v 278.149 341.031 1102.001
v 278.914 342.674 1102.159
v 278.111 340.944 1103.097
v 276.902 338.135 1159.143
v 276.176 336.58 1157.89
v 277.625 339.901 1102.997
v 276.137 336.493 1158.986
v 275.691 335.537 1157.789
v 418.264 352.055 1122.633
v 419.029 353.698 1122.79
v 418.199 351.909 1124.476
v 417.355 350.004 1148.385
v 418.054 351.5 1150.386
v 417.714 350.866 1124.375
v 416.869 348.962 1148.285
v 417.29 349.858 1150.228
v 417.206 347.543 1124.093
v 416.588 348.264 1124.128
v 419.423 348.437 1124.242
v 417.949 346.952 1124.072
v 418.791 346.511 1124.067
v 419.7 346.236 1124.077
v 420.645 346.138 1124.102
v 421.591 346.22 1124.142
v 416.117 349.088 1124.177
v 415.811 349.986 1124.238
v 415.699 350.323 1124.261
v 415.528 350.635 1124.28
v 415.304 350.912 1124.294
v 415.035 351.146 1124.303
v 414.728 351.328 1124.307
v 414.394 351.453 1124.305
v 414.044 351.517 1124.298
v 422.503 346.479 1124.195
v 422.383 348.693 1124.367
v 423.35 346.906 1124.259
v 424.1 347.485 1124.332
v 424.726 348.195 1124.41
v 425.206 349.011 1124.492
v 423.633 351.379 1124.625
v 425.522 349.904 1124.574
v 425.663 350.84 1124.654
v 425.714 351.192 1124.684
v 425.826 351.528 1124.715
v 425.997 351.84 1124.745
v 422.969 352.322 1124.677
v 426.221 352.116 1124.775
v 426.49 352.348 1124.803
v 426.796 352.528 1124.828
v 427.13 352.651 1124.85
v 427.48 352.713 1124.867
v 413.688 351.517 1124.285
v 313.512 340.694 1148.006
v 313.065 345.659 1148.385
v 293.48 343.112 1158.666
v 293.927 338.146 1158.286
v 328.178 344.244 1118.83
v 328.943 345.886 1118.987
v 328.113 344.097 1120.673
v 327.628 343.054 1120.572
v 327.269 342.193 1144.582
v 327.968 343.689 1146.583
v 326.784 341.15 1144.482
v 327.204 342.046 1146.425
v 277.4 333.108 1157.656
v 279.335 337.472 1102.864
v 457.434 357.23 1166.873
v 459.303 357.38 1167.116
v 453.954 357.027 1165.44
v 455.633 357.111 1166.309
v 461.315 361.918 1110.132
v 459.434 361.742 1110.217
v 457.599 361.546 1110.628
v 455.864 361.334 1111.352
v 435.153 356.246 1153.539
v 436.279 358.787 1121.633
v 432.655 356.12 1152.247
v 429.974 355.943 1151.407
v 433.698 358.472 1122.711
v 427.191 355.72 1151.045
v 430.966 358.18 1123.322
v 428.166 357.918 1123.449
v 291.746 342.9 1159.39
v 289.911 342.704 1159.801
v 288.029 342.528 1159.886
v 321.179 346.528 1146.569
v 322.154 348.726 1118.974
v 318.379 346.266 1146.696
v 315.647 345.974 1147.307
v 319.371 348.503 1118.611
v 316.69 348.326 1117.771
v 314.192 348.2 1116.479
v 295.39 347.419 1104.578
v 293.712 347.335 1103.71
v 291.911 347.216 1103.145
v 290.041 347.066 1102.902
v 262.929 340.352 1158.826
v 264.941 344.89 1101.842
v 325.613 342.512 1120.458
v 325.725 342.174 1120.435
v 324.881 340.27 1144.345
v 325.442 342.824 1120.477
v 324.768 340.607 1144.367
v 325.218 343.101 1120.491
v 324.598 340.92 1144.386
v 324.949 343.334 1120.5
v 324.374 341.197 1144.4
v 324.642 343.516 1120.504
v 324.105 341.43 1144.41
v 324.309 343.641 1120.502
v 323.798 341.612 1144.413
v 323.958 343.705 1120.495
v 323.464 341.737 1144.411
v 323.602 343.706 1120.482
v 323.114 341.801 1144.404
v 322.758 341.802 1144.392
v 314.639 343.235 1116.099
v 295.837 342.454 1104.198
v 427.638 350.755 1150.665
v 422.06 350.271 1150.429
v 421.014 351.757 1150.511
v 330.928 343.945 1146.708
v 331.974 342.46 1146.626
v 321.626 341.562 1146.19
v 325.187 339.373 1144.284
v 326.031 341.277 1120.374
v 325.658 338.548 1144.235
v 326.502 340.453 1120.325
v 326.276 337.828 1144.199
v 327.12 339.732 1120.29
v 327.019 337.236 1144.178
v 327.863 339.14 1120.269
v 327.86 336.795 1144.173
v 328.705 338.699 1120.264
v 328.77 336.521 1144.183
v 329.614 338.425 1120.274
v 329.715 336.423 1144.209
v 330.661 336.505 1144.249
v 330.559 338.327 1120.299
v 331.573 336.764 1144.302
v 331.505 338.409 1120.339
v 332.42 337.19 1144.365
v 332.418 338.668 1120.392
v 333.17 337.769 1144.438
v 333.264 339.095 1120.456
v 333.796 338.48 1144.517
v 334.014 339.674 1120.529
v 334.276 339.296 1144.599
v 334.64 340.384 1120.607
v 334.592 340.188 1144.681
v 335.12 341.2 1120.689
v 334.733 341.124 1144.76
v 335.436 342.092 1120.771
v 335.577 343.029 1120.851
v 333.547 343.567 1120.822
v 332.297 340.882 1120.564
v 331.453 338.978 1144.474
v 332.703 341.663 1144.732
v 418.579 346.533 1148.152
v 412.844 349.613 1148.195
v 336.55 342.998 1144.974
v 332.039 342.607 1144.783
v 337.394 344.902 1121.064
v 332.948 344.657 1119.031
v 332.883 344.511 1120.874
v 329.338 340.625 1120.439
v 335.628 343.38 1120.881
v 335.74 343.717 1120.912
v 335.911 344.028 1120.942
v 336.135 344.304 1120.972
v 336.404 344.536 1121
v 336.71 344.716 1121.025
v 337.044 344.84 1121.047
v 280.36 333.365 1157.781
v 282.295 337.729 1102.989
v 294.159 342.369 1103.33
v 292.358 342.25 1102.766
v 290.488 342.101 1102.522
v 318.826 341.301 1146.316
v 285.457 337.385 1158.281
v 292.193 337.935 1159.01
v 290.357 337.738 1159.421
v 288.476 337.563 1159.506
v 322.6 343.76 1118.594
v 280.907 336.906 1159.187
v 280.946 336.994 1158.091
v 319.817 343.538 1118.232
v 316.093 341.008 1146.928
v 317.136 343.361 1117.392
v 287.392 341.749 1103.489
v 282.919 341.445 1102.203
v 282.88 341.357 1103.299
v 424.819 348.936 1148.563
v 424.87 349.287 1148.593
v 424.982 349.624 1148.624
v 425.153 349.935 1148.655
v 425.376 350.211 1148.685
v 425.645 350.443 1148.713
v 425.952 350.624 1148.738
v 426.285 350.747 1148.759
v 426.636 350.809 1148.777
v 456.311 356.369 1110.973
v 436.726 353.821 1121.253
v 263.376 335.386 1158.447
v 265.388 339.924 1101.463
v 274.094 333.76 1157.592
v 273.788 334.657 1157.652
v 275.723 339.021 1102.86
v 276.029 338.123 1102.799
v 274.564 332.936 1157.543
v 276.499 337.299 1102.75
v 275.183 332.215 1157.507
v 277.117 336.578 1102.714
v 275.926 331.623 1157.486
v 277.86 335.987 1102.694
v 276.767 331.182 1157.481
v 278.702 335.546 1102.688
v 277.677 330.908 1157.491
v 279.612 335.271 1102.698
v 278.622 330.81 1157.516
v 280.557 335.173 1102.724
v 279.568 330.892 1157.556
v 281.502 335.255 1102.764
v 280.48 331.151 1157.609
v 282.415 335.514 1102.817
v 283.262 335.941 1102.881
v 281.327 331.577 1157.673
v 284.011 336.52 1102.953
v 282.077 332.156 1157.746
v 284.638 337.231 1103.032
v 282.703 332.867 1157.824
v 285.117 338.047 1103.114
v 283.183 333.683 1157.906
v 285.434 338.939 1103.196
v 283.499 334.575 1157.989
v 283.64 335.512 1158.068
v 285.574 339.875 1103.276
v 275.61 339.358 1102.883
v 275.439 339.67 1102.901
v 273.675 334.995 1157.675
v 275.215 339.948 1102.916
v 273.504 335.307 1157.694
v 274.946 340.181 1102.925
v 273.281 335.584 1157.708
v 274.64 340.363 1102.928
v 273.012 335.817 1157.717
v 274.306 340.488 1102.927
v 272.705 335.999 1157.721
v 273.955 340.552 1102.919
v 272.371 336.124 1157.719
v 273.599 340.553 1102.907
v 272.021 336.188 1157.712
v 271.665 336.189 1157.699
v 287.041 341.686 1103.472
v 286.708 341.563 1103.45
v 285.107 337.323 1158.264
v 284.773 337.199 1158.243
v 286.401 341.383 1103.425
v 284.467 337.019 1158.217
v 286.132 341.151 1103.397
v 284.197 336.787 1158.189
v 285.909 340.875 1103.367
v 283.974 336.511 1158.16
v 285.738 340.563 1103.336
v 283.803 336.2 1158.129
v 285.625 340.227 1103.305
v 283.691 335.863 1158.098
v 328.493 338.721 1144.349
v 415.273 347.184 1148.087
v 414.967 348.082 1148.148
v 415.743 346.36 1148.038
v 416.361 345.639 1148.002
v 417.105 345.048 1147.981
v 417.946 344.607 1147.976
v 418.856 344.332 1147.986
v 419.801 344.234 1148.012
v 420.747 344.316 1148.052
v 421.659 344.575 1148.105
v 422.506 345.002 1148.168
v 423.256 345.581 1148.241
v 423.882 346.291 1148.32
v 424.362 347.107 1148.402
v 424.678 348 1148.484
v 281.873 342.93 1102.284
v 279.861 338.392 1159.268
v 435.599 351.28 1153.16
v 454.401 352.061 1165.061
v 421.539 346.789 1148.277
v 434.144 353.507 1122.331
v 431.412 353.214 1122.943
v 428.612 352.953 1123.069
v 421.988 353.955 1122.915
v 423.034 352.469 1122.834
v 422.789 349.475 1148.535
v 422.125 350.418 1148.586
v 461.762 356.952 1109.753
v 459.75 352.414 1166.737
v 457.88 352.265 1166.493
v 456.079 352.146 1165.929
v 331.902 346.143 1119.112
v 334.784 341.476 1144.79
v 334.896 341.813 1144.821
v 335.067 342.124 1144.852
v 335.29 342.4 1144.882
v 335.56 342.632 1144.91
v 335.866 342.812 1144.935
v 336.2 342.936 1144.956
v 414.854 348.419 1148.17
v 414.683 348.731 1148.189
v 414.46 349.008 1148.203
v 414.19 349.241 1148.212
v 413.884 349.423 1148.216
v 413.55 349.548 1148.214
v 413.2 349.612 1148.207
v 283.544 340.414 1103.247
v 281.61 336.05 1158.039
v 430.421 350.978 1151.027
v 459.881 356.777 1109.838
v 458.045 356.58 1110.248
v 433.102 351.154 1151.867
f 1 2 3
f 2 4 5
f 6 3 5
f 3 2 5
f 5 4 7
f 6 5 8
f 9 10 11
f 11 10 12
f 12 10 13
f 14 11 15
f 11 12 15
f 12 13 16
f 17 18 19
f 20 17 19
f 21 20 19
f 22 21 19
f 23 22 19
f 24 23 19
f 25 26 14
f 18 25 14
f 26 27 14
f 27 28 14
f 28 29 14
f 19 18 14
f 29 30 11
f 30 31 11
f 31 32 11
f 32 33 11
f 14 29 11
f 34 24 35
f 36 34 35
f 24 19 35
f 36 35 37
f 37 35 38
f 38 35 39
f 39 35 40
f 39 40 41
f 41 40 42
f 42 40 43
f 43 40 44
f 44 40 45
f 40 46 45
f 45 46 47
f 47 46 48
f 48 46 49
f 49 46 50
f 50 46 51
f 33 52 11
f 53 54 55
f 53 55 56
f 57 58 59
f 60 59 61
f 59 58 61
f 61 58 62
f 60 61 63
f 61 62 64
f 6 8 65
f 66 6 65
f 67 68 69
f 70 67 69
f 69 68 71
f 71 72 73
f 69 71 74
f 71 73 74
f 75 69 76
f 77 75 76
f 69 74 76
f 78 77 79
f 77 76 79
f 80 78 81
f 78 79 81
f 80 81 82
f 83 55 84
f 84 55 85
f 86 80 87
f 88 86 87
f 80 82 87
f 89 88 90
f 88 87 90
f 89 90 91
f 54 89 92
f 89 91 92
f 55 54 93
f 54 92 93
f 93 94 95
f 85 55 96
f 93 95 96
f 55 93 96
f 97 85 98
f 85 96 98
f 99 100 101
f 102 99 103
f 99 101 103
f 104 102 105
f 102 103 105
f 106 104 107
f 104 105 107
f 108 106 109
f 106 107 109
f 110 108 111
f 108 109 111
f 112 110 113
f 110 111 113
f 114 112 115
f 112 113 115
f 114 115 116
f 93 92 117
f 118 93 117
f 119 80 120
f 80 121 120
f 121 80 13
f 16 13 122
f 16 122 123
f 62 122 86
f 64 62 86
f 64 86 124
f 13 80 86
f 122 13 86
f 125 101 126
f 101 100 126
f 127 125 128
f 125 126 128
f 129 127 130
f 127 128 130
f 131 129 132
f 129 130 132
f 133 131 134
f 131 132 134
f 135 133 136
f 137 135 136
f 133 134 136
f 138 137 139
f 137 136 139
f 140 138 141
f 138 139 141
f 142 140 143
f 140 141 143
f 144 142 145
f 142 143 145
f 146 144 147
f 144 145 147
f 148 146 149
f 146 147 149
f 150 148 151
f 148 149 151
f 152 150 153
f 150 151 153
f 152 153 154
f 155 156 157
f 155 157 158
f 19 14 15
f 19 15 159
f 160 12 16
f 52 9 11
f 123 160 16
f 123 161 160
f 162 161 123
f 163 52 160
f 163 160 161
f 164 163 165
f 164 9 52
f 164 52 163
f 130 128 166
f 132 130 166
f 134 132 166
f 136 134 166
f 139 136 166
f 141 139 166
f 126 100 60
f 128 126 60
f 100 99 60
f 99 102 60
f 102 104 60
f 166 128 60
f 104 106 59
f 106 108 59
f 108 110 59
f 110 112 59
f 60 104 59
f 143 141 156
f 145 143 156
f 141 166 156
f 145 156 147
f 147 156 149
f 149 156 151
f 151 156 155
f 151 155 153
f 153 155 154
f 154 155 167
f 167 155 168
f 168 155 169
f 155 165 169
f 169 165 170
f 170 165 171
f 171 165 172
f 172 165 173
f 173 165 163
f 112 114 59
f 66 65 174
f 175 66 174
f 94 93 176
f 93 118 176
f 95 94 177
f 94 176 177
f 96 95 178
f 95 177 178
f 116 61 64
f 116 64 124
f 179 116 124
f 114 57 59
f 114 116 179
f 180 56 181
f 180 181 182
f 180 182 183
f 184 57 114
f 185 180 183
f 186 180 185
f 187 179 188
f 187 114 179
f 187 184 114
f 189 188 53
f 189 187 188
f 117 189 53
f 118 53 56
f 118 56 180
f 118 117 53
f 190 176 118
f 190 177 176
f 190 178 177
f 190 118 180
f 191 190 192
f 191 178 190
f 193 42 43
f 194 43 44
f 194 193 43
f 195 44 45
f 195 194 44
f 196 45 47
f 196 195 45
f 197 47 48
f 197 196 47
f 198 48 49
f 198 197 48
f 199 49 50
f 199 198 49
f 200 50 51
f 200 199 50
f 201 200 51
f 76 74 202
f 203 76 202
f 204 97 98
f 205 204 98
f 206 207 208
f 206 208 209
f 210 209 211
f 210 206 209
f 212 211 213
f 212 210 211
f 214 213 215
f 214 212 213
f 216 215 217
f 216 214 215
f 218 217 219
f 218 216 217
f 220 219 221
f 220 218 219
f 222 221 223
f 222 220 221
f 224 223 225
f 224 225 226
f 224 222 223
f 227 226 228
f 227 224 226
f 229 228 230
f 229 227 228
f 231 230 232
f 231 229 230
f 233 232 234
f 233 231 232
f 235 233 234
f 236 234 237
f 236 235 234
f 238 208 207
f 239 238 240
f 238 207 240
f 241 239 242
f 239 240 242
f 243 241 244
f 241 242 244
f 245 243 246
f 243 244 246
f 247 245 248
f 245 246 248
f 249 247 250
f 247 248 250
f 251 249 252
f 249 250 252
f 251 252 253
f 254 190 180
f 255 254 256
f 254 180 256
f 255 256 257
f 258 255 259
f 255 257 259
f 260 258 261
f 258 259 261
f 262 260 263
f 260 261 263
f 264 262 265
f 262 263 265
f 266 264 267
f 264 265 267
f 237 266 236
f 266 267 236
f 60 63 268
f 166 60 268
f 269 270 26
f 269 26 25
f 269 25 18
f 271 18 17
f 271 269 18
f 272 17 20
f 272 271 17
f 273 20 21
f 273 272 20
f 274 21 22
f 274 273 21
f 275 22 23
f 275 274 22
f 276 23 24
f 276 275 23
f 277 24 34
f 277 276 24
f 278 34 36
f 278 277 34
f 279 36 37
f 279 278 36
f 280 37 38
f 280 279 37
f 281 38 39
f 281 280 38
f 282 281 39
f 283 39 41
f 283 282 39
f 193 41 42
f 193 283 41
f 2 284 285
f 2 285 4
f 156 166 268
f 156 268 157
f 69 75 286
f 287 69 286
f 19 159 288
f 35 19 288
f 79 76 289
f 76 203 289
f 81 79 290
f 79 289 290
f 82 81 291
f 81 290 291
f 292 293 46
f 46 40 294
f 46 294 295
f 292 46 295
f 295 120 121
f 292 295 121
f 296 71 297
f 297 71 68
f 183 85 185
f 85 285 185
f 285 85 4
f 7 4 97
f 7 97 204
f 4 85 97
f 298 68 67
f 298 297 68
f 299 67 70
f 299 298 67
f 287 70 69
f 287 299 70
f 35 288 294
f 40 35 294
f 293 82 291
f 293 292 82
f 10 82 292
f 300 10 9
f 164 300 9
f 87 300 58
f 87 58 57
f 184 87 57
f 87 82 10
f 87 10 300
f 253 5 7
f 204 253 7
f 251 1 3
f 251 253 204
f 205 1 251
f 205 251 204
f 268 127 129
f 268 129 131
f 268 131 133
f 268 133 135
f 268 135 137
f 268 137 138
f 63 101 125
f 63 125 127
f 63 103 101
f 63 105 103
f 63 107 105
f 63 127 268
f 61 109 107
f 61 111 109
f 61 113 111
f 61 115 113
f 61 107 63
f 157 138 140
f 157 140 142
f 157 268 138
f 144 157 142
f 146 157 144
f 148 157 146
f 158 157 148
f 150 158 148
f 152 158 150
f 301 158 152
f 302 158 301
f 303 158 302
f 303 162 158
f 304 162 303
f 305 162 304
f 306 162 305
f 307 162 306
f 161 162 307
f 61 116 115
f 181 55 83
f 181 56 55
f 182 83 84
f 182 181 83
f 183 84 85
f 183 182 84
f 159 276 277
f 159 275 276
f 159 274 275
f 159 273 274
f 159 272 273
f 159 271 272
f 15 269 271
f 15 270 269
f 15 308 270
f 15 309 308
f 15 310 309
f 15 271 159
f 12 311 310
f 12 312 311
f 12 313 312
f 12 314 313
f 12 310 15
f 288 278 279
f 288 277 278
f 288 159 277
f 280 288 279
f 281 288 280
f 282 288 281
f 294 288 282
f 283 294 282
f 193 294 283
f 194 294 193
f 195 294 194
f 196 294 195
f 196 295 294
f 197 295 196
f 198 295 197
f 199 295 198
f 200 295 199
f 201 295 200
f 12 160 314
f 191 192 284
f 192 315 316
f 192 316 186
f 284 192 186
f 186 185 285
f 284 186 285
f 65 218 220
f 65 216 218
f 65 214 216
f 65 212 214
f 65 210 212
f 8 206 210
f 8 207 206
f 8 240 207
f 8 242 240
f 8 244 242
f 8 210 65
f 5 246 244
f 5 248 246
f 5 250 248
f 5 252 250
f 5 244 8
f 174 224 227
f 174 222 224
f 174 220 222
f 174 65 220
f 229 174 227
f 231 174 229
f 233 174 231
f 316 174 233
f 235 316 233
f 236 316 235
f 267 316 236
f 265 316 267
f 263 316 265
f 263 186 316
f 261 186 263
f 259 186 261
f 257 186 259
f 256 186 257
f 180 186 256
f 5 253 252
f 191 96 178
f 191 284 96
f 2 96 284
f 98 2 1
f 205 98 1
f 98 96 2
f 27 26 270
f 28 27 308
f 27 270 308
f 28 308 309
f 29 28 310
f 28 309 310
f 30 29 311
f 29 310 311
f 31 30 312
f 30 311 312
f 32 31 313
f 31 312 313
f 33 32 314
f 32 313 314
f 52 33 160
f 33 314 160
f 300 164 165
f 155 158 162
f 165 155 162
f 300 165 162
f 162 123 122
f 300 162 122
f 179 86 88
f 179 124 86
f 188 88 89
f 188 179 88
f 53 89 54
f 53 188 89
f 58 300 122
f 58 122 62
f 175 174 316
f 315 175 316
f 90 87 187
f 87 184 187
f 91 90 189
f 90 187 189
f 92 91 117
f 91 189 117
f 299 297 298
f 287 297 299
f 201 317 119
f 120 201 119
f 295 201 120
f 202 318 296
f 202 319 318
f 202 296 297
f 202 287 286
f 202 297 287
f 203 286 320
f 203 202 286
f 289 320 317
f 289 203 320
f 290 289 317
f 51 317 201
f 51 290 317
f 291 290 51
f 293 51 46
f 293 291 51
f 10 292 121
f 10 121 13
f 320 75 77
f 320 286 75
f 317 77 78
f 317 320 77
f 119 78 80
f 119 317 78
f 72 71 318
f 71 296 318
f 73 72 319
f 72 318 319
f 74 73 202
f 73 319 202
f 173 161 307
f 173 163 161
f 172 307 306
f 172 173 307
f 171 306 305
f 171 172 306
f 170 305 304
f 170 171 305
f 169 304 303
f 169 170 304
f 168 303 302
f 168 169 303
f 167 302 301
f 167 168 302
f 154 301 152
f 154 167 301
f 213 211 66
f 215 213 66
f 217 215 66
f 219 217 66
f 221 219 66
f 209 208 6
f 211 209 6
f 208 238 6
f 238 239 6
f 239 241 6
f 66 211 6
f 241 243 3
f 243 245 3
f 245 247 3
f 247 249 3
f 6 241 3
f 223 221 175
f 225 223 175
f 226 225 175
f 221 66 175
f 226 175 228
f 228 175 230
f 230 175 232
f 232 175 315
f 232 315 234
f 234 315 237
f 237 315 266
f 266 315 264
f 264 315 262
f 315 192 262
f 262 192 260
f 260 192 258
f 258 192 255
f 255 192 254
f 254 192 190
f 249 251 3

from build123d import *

# Parameters (mm, degrees)
EXTRUDE_1_DEPTH     = 5
SKETCH_2_R          = 5.000000000012101
EXTRUDE_3_DEPTH     = 27.5
CUT_EXTRUDE_1_DEPTH = 59.80000000000002
SKETCH_4_R          = 5.0000000000065405
SKETCH_4_R_2        = 5.000000000006525
EXTRUDE_4_DEPTH     = 12
CUT_EXTRUDE_2_DEPTH = 39.00000000000001
FILLET_1_R          = 2


with BuildPart() as part:
    # 草图1 → 凸台-拉伸1 (new body)
    with BuildSketch(Plane(origin=(-35.95282664063733, 399.74242683802464, 30.566209896758863), x_dir=(0.9960030029050825, 0.08905977205298914, 0.006809934355634975), z_dir=(-0.0893197525973871, 0.9931039643902259, 0.07593745919082788))):
        with BuildLine():
            Line((300.07791562372654, -1129.6042951871439), (302.10510848643986, -1072.2401034897346))
            Line((302.10510848643986, -1072.2401034897346), (327.3060115945207, -1073.1306780695022))
            ThreePointArc((327.3060115945207, -1073.1306780695022), (330.1251349541227, -1073.6036481637962), (332.72578534648983, -1074.7901450088955))
            Line((332.72578534648983, -1074.7901450088955), (351.6029613751, -1086.5968806615322))
            ThreePointArc((351.6029613751, -1086.5968806615322), (355.4148735940491, -1088.3359924755819), (359.5470133129178, -1089.029250011054))
            Line((359.5470133129178, -1089.029250011054), (465.98440043114425, -1092.7906402635294))
            ThreePointArc((465.98440043114425, -1092.7906402635294), (470.1551691567732, -1092.390799165044), (474.0803358930331, -1090.9251079426926))
            Line((474.0803358930331, -1090.9251079426926), (493.74385691829394, -1080.480361776527))
            ThreePointArc((493.74385691829394, -1080.480361776527), (496.42177441125835, -1079.4804042136147), (499.26725213995996, -1079.2076154267972))
            Line((499.26725213995996, -1079.2076154267972), (497.24005927724687, -1136.5718071242063))
            ThreePointArc((497.24005927724687, -1136.5718071242063), (494.4209359176449, -1136.0988370299121), (491.8202855252778, -1134.9123401848128))
            Line((491.8202855252778, -1134.9123401848128), (472.9431094966676, -1123.1056045321764))
            ThreePointArc((472.9431094966676, -1123.1056045321764), (469.13119727771857, -1121.3664927181267), (464.9990575588499, -1120.6732351826547))
            Line((464.9990575588499, -1120.6732351826547), (358.5616704406234, -1116.9118449301766))
            ThreePointArc((358.5616704406234, -1116.9118449301766), (354.39090171499237, -1117.3116860286625), (350.4657349787294, -1118.777377251013))
            Line((350.4657349787294, -1118.777377251013), (330.80221395347337, -1129.222123417182))
            ThreePointArc((330.80221395347337, -1129.222123417182), (328.12429646050896, -1130.2220809800938), (325.2788187318076, -1130.494869766911))
            Line((325.2788187318076, -1130.494869766911), (300.07791562372654, -1129.6042951871439))
        make_face()
    extrude(amount=-EXTRUDE_1_DEPTH)

    # 草图2 → 凸台-拉伸3 (add, symmetric)
    with BuildSketch(Plane(origin=(-38.327599823670674, -86.44895602357099, 1085.4904824160742), x_dir=(0.9993811405079088, -0.0027925735986703876, 0.03506476193855483), z_dir=(-0.03517578708588501, -0.07933995566829466, 0.9962267991965693))):
        with Locations((318.1419856303242, 426.65964110326615)):
            Circle(SKETCH_2_R)
    extrude(amount=EXTRUDE_3_DEPTH, both=True)

    # 草图3 → 切除-拉伸1 (cut)
    with BuildSketch(Plane(origin=(-39.33714491302575, -88.72601275125034, 1114.0821915530184), x_dir=(0.9993811405079092, -0.002792573598669658, 0.03506476193854602), z_dir=(-0.03517578708587617, -0.07933995566829388, 0.9962267991965696))):
        Polygon((321.1034402768945, 426.9253847947825), (319.3925721658551, 429.35720790511795), (316.43111751927484, 429.0914642136009), (315.18053098373395, 426.39389741174824), (316.8913990947733, 423.9620743014128), (319.8528537413536, 424.2278179929299), align=None)
    extrude(amount=-CUT_EXTRUDE_1_DEPTH, mode=Mode.SUBTRACT)

    # 草图4 → 凸台-拉伸4 (add, symmetric)
    with BuildSketch(Plane(origin=(-38.327599823670674, -86.44895602357099, 1085.4904824160742), x_dir=(0.9993811405079088, -0.0027925735986703876, 0.03506476193855483), z_dir=(-0.03517578708588501, -0.07933995566829466, 0.9962267991965693))):
        with Locations((368.7211342547294, 431.1983193115499)):
            Circle(SKETCH_4_R)
        with Locations((458.86276991896267, 439.2871046820992)):
            Circle(SKETCH_4_R_2)
    extrude(amount=EXTRUDE_4_DEPTH, both=True)

    # 草图5 → 切除-拉伸2 (cut)
    with BuildSketch(Plane(origin=(-38.81830205352909, -87.55574840514421, 1099.3878462648613), x_dir=(0.9993811405079085, -0.002792573598671172, 0.0350647619385643), z_dir=(-0.035175787085894514, -0.07933995566829542, 0.9962267991965689))):
        Polygon((369.9717207902861, 433.8958861133999), (367.01026614370573, 433.6301424218828), (365.75967960816484, 430.9325756200302), (367.47054771920426, 428.5007525096948), (370.4320023657846, 428.7664962012118), (371.6825889013256, 431.46406300306455), align=None)
        Polygon((460.1133564545191, 441.9846714839496), (457.1519018079389, 441.7189277924325), (455.90131527239805, 439.02136099058004), (457.61218338343764, 436.58953788024445), (460.57363803001766, 436.8552815717618), (461.82422456555855, 439.5528483736145), align=None)
    extrude(amount=-CUT_EXTRUDE_2_DEPTH, mode=Mode.SUBTRACT)

    # 圆角1
    fillet_1_edges = [part.edges().sort_by_distance(p)[0] for p in [
        (415.285524437343, 350.7404864262651, 1136.3250812261313),
        (425.0382330865837, 351.5861636609777, 1136.7367898828338),
        (325.19967377997307, 342.9289587973129, 1132.5221249504996),
        (334.952382429214, 343.7746360320256, 1132.9338336072021),
        (274.6518265417908, 338.545851989709, 1130.3882576287017),
        (284.4045351910414, 339.3915292244225, 1130.7999662854045),
    ]]
    fillet(fillet_1_edges, radius=FILLET_1_R)

    # 切除-扫描1: sweep along a curve in space
    with BuildLine() as sweep_1_path:
        Line((290.044943776391, 347.0743828700847, 1102.8022885042362), (264.94476860482246, 344.89789554811915, 1101.7426895995065))
        ThreePointArc((295.44305470841834, 347.43054527632216, 1104.493833582377), (292.8527991081144, 347.28939307381154, 1103.2930799825197), (290.044943776391, 347.0743828700847, 1102.8022885042362))
        Line((314.24477871928195, 348.21157078080637, 1116.3947560242318), (295.44305470841834, 347.43054527632216, 1104.493833582377))
        ThreePointArc((322.1570783045824, 348.73361704748316, 1118.8741440154793), (318.0414547361659, 348.4184651050343, 1118.1547647253926), (314.24477871928195, 348.21157078080637, 1116.3947560242318))
        Line((428.16903549570674, 357.926129817856, 1123.34941771218), (322.1570783045824, 348.73361704748316, 1118.8741440154793))
        ThreePointArc((436.23261152707437, 358.7893842711662, 1121.5444481339446), (432.32313367085544, 358.32806229446095, 1122.979143081403), (428.16903549570674, 357.926129817856, 1123.34941771218))
        Line((455.8175375159207, 361.33694338754674, 1111.264010490222), (436.23261152707437, 358.7893842711662, 1121.5444481339446))
        ThreePointArc((461.31885574293176, 361.925892687469, 1110.0325826471264), (458.4847513804454, 361.6516770725888, 1110.2851999185907), (455.8175375159207, 361.33694338754674, 1111.264010490222))
    # 草图8 → 切除-扫描1 (sweep, cut)
    with BuildSketch(Plane(origin=(534.589737117881, 46.35536514533573, 22.567599471235773), x_dir=(0.04186275100976178, 0.0036300044207879887, -0.9991167765310519), z_dir=(0.9953816583596613, 0.08631157133878511, 0.042019838816923734))):
        Polygon((-1088.4263068343075, 320.7205078186499), (-1088.5260175810986, 320.71290735982717), (-1088.145994639964, 315.7273700202607), (-1088.046283893173, 315.7349704790834), align=None)
    sweep_1 = sweep(path=sweep_1_path.line, mode=Mode.SUBTRACT)

    # 镜向2: 切除-扫描1 across plane
    add(sweep_1.mirror(Plane(origin=(-38.327599823670674, -86.44895602357099, 1085.4904824160742), x_dir=(0.9993811405079088, -0.002792573598670388, 0.035064761938554824), z_dir=(-0.035175787085885, -0.07933995566829465, 0.9962267991965692))), mode=Mode.SUBTRACT)

    # 镜向3: part across plane


with BuildPart() as part_1:
    add(part.part)
    add(part.part.mirror(Plane(origin=(-38.327599823670674, -86.44895602357099, 1085.4904824160742), x_dir=(0.9993811405079088, -0.002792573598670388, 0.035064761938554824), z_dir=(-0.035175787085885, -0.07933995566829465, 0.9962267991965692))))


solid = part_1.part
